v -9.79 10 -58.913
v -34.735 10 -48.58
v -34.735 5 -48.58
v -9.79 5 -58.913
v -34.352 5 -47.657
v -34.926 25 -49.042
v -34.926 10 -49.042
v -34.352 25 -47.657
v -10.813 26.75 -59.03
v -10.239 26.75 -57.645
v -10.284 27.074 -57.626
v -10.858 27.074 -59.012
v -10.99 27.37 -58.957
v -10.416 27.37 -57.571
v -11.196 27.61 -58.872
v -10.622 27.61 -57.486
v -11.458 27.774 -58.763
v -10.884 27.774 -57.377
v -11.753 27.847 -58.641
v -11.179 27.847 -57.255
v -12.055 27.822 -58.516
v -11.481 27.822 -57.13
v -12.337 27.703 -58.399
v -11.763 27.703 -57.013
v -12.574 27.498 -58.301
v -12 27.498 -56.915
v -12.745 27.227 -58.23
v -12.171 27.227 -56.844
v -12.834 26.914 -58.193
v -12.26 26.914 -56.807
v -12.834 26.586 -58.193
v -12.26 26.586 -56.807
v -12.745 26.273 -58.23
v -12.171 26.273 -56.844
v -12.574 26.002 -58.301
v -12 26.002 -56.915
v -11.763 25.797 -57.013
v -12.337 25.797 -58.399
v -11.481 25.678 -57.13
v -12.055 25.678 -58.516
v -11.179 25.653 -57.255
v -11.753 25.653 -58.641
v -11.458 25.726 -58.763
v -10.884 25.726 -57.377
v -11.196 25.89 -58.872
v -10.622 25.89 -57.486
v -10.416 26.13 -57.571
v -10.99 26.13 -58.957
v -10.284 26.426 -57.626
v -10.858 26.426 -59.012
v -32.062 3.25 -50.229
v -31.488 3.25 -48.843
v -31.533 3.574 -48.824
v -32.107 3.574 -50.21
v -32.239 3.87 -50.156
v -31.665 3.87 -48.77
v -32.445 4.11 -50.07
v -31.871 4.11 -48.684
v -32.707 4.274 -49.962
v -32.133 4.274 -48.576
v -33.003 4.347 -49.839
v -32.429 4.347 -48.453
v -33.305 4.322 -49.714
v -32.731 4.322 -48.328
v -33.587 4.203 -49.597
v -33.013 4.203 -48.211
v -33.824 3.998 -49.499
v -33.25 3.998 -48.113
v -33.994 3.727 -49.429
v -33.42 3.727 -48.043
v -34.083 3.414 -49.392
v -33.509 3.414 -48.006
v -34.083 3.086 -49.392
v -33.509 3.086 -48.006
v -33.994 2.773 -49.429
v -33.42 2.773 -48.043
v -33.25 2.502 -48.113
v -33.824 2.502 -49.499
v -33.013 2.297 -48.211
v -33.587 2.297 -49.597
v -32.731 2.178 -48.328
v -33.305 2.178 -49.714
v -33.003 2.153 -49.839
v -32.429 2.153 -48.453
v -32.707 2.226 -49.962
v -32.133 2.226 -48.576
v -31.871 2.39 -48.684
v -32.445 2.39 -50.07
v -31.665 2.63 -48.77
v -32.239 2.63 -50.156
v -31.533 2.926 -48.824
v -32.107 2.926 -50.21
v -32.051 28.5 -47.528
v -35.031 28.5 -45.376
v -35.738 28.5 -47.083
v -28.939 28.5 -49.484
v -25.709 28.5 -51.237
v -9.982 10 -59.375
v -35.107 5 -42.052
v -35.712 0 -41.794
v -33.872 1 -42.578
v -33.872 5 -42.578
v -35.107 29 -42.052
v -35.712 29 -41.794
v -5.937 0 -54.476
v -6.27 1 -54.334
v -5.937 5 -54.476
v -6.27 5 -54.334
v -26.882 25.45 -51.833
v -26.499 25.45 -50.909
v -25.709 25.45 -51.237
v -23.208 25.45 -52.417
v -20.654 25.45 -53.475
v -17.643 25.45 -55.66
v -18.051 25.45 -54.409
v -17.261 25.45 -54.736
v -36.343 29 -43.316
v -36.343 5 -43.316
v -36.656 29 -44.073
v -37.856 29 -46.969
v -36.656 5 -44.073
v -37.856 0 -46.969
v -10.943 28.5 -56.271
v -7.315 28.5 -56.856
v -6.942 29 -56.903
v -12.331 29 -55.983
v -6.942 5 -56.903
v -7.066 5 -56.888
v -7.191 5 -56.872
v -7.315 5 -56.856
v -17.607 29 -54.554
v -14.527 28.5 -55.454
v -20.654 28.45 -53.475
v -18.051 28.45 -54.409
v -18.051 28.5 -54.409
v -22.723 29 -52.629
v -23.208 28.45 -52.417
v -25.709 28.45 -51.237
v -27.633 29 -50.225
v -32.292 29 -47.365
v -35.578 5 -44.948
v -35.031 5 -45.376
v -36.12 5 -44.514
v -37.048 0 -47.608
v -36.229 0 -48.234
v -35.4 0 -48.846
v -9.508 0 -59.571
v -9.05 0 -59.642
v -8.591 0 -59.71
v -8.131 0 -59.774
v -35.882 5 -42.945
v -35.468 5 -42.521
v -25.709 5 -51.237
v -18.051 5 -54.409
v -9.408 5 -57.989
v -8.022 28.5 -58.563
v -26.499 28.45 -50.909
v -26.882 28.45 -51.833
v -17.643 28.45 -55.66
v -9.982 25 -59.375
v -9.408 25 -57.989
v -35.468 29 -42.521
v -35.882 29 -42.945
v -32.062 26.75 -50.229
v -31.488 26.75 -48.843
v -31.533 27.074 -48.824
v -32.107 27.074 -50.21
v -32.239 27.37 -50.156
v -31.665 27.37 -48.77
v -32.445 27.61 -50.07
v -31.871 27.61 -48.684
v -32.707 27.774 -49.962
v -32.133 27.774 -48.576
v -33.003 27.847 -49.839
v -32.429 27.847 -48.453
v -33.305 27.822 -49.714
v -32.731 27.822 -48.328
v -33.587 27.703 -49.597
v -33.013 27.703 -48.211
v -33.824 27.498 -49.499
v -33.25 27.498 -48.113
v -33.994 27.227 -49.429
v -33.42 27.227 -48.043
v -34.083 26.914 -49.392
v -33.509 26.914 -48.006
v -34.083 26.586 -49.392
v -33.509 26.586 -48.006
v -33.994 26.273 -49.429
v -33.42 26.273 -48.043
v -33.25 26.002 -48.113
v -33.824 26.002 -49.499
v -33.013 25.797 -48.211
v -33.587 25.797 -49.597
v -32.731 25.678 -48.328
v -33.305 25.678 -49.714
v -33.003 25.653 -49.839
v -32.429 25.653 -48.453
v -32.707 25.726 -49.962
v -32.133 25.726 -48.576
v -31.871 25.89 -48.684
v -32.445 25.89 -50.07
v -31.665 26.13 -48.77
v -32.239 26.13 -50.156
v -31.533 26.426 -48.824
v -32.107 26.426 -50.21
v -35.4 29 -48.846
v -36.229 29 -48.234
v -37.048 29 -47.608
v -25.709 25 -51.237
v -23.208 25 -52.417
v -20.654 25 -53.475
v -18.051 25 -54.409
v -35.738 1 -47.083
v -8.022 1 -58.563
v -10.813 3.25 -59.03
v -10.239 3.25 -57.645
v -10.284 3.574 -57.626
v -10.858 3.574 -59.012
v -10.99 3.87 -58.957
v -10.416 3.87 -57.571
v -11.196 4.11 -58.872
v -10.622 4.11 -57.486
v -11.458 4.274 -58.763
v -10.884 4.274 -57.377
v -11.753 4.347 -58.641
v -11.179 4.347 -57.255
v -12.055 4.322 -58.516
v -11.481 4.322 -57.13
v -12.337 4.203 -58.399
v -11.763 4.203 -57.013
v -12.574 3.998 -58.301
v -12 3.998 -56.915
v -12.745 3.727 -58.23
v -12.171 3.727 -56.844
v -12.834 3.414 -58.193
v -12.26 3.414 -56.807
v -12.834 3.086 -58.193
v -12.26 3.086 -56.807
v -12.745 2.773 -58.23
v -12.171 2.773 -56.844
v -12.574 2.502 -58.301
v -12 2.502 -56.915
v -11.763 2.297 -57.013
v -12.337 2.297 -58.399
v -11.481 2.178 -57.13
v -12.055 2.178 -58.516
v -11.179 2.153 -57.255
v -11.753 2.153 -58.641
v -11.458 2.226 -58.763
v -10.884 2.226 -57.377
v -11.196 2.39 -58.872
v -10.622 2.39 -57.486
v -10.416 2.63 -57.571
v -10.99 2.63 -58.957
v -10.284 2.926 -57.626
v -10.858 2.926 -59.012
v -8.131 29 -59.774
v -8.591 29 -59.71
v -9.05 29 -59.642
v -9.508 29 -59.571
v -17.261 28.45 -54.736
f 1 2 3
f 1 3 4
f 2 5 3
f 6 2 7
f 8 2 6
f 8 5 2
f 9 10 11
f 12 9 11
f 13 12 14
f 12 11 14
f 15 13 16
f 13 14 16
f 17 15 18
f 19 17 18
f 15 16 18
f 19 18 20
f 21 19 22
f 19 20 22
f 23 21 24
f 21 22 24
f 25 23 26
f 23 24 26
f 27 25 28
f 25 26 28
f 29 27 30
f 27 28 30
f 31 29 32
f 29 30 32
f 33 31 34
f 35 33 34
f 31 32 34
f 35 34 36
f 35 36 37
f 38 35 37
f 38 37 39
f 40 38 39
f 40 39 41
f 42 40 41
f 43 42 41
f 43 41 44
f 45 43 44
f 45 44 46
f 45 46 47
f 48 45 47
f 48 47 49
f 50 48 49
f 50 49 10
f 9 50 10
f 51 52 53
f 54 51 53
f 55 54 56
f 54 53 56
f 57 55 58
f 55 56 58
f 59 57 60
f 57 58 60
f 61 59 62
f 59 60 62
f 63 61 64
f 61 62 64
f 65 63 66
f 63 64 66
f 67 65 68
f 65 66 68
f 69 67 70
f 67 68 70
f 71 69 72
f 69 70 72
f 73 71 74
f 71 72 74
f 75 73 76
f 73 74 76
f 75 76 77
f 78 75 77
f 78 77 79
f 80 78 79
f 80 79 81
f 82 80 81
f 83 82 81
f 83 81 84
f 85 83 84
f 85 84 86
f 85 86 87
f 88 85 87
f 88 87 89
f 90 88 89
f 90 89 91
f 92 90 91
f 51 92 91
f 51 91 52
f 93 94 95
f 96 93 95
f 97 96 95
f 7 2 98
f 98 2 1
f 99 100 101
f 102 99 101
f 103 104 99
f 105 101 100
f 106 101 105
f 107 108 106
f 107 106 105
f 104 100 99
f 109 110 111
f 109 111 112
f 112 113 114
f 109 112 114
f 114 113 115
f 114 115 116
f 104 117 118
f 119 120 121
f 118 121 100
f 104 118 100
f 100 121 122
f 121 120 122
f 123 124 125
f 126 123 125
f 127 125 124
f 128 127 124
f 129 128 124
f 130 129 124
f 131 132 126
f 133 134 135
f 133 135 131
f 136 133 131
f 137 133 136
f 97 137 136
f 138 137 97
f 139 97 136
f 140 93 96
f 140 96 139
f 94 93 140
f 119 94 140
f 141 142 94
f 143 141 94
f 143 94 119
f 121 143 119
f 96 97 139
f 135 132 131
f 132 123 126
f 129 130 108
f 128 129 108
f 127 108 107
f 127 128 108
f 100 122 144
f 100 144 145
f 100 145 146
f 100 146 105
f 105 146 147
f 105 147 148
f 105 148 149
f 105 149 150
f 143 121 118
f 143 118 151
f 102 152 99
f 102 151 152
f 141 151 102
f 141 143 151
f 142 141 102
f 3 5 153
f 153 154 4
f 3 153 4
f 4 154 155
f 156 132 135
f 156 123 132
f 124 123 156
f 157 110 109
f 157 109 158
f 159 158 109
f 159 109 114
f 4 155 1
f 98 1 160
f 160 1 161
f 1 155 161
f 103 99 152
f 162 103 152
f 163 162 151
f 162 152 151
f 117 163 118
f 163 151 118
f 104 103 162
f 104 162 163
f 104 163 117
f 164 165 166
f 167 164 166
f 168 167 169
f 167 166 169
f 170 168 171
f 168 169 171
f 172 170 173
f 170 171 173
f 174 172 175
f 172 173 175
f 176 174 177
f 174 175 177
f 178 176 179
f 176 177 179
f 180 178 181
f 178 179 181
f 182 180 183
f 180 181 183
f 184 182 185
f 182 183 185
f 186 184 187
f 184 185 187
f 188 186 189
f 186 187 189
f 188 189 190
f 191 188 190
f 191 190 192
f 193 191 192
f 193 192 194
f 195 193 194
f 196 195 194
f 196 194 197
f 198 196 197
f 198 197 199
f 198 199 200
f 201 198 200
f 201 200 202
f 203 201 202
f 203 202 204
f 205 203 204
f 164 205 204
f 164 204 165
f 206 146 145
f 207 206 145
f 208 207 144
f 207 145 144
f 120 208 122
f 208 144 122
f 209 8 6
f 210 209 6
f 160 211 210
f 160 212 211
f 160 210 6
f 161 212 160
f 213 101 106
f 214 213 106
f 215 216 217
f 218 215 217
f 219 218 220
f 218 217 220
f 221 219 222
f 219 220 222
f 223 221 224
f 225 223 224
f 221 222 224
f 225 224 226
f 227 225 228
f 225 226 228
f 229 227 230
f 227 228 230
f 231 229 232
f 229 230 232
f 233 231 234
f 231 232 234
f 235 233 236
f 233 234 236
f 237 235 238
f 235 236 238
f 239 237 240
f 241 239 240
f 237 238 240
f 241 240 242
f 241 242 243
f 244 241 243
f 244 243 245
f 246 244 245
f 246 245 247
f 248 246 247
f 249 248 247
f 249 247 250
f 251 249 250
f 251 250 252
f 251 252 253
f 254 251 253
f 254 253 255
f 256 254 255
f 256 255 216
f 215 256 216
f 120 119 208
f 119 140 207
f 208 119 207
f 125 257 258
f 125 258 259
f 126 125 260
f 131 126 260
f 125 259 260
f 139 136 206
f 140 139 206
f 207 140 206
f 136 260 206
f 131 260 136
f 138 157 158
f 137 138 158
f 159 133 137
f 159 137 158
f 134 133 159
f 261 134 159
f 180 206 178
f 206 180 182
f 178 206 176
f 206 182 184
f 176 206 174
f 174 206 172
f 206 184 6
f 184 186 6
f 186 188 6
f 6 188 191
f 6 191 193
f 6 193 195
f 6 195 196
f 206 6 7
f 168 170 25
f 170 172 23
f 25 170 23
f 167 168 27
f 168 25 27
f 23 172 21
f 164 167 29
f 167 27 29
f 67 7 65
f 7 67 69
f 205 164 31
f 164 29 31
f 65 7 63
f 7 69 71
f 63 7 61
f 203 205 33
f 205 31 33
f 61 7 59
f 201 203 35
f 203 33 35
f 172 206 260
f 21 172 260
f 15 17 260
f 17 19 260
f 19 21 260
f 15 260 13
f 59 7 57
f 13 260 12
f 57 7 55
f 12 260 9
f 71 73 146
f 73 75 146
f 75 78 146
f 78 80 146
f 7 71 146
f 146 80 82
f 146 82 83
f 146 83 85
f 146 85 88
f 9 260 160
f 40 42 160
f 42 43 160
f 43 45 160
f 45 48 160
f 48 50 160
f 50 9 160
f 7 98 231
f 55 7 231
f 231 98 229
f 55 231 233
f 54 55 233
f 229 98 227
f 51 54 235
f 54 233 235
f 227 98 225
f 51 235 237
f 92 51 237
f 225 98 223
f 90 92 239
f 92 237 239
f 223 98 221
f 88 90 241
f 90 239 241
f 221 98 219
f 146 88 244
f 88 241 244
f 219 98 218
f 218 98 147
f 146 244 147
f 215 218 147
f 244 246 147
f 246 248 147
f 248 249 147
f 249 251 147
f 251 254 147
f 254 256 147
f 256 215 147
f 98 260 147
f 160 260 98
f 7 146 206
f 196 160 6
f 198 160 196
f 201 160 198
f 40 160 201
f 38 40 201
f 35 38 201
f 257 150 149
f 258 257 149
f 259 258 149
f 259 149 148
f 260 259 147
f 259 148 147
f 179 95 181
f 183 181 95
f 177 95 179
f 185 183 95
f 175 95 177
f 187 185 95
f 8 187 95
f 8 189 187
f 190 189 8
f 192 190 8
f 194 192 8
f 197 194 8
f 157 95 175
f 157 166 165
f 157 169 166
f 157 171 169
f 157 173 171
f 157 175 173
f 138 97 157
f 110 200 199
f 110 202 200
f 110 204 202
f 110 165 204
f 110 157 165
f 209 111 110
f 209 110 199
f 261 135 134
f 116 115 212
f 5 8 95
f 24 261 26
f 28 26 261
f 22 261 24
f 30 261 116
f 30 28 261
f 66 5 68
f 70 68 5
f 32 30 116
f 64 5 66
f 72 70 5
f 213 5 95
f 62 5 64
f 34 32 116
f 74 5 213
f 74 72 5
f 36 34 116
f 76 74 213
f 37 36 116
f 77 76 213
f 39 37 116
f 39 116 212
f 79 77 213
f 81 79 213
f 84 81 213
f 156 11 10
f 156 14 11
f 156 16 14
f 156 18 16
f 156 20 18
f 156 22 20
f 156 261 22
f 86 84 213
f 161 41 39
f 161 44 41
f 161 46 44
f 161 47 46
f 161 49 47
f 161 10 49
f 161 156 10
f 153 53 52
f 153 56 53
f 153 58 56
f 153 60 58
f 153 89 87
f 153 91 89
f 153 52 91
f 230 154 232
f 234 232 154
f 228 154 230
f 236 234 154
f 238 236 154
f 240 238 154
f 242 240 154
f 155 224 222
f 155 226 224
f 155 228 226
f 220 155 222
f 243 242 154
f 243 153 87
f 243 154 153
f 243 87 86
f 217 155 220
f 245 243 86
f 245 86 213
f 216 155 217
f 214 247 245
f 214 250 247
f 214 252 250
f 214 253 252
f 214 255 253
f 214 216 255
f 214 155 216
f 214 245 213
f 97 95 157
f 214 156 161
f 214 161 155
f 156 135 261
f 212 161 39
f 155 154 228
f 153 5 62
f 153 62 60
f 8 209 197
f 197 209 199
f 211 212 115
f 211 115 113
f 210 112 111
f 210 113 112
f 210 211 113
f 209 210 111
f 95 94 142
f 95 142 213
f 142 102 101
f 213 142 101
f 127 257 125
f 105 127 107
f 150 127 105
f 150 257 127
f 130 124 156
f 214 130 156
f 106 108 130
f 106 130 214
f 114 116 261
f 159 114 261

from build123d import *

# Parameters (mm, degrees)
SKETCH1_R                = 60.325
BOSS_EXTRUDE1_DEPTH      = 5
SKETCH3_R                = 60.325
SKETCH3_R_2              = 57.325
BOSS_EXTRUDE3_DEPTH      = 24
BOSS_EXTRUDE13_DEPTH     = 2
SKETCH7_R                = 5.5
CUT_EXTRUDE1_DEPTH       = 5
SKETCH14_R               = 2.5000000000000004
CUT_EXTRUDE7_DEPTH       = 5
SKETCH15_R               = 12.5
BOSS_EXTRUDE15_DEPTH     = 3
SKETCH16_R               = 10.5
CUT_EXTRUDE9_DEPTH       = 5
SKETCH17_R               = 2.5000000000000018
SKETCH17_R_2             = 2.500000000000002
SKETCH17_R_3             = 2.5000000000000004
CUT_EXTRUDE10_DEPTH      = 5
SKETCH20_W               = 10.617189631650703
SKETCH20_H               = 4.842928603910877
CUT_EXTRUDE13_DEPTH      = 1
SKETCH26_W               = 50
SKETCH26_H               = 24
BOSS_EXTRUDE46_DEPTH     = 10
SKETCH27_W               = 45
SKETCH27_H               = 20.000000000000004
CUT_EXTRUDE15_DEPTH      = 5
SKETCH29_R               = 1.0999999999999992
CUT_EXTRUDE17_DEPTH      = 10
CUT_EXTRUDE18_DEPTH      = 20
BOSS_EXTRUDE47_DEPTH     = 24
CUT_EXTRUDE19_START      = -30
CUT_EXTRUDE19_DEPTH      = 30
SKETCH31_R               = 3.0000000000000018
SKETCH31_R_2             = 3.0000000000000004
BOSS_EXTRUDE48_DEPTH     = 10
SKETCH32_R               = 1.5000000000000024
SKETCH32_R_2             = 1.5000000000000042
CUT_EXTRUDE20_DEPTH      = 5
SKETCH33_R               = 2.500000000000004
SKETCH33_R_2             = 2.4999999999999973
BOSS_EXTRUDE49_DEPTH     = 5
SKETCH34_R               = 1.100000000000003
SKETCH34_R_2             = 1.100000000000001
SKETCH34_R_3             = 1.1
SKETCH34_R_4             = 1.0999999999999983
CUT_EXTRUDE21_DEPTH      = 5
BOSS_EXTRUDE50_DEPTH     = 15
BOSS_EXTRUDE51_DEPTH     = 2
CUT_EXTRUDE25_DEPTH      = 2
CUT_EXTRUDE26_DEPTH      = 12
SKETCH41_R               = 1.0999999999999992
SKETCH41_R_2             = 1.100000000000001
CUT_EXTRUDE27_DEPTH      = 12
CUT_EXTRUDE28_DEPTH      = 4
CUT_EXTRUDE28_DEPTH_BACK = 2.5
SKETCH44_R               = 2.499999999999999
BOSS_EXTRUDE52_DEPTH     = 5
SKETCH45_R               = 1.0999999999999983
CUT_EXTRUDE29_DEPTH      = 5
CUT_EXTRUDE30_DEPTH      = 5
SKETCH47_R               = 1.100000000000001
CUT_EXTRUDE31_DEPTH      = 3
CUT_EXTRUDE32_DEPTH      = 5
SKETCH49_W               = 27
SKETCH49_H               = 5
CUT_EXTRUDE33_DEPTH      = 1
SKETCH50_W               = 54.2861765056904
SKETCH50_H               = 77.14351398178086
CUT_EXTRUDE34_DEPTH      = 121.99999999999999
CUT_EXTRUDE35_DEPTH      = 121.99999999999999
CUT_EXTRUDE35_DEPTH_BACK = 121.99999999999999


with BuildPart() as part:
    # Sketch1 → Boss-Extrude1 (new body)
    with BuildSketch(Plane(origin=(0, 0, 0), x_dir=(1, 0, 0), z_dir=(0, 1, 0))):
        Circle(SKETCH1_R)
    extrude(amount=BOSS_EXTRUDE1_DEPTH)

    # Sketch3 → Boss-Extrude3 (add)
    with BuildSketch(Plane(origin=(0, 5, 0), x_dir=(1, 0, 0), z_dir=(0, 1, 0))):
        Circle(SKETCH3_R)
        Circle(SKETCH3_R_2, mode=Mode.SUBTRACT)
    extrude(amount=BOSS_EXTRUDE3_DEPTH)

    # Sketch6 → Boss-Extrude13 (add)
    with BuildSketch(Plane.XY.offset(60.325)):
        Polygon((-7.5, 19.5), (7.5, 19.5), (7.5000000000000036, 4.500000000000001), (-7.4999999999999964, 4.500000000000001), align=None)
    extrude(amount=-BOSS_EXTRUDE13_DEPTH)

    # Sketch7 → Cut-Extrude1 (cut)
    with BuildSketch(Plane.XY.offset(60.325)):
        with Locations((0, 12.313384582393407)):
            Circle(SKETCH7_R)
    extrude(amount=-CUT_EXTRUDE1_DEPTH, mode=Mode.SUBTRACT)

    # Sketch14 → Cut-Extrude7 (cut)
    with BuildSketch(Plane(origin=(0, 0, -60.325), x_dir=(-1, 0, 0), z_dir=(0, 0, -1))):
        with Locations((0, 13.215899789160813)):
            Circle(SKETCH14_R)
    extrude(amount=-CUT_EXTRUDE7_DEPTH, mode=Mode.SUBTRACT)

    # Sketch15 → Boss-Extrude15 (add)
    with BuildSketch(Plane.ZY.offset(60.325)):
        with Locations((0, 14.079498945802262)):
            Circle(SKETCH15_R)
    extrude(amount=-BOSS_EXTRUDE15_DEPTH)

    # Sketch16 → Cut-Extrude9 (cut)
    with BuildSketch(Plane.ZY.offset(60.325)):
        with Locations((0, 14.367365331349822)):
            Circle(SKETCH16_R)
    extrude(amount=-CUT_EXTRUDE9_DEPTH, mode=Mode.SUBTRACT)

    # Sketch17 → Cut-Extrude10 (cut)
    with BuildSketch(Plane(origin=(0, 5, 0), x_dir=(1, 0, 0), z_dir=(0, 1, 0))):
        with Locations((0, 40)):
            Circle(SKETCH17_R)
        with Locations((40, 0)):
            Circle(SKETCH17_R_2)
        with Locations((0, -40)):
            Circle(SKETCH17_R_3)
        with Locations((-40, 0)):
            Circle(SKETCH17_R_2)
    extrude(amount=-CUT_EXTRUDE10_DEPTH, mode=Mode.SUBTRACT)

    # Sketch20 → Cut-Extrude13 (cut)
    with BuildSketch(Plane(origin=(0, 5, 0), x_dir=(1, 0, 0), z_dir=(0, 1, 0))):
        with Locations((0.20330529432061706, 46.91179778863133)):
            Rectangle(SKETCH20_W, SKETCH20_H)
    extrude(amount=-CUT_EXTRUDE13_DEPTH, mode=Mode.SUBTRACT)

    # Sketch26 → Boss-Extrude46 (add)
    with BuildSketch(Plane(origin=(50, 0, 0), x_dir=(0, 0, -1), z_dir=(1, 0, 0))):
        with Locations((3.55e-15, 17.000000000000004)):
            Rectangle(SKETCH26_W, SKETCH26_H)
    extrude(amount=BOSS_EXTRUDE46_DEPTH)

    # Sketch27 → Cut-Extrude15 (cut)
    with BuildSketch(Plane(origin=(60.325, 0, 0), x_dir=(0, 0, -1), z_dir=(1, 0, 0))):
        with Locations((7.11e-15, 15.000000000000002)):
            Rectangle(SKETCH27_W, SKETCH27_H)
    extrude(amount=-CUT_EXTRUDE15_DEPTH, mode=Mode.SUBTRACT)

    # Sketch29 → Cut-Extrude17 (cut)
    with BuildSketch(Plane(origin=(55.325, 0, 0), x_dir=(0, 0, -1), z_dir=(1, 0, 0))):
        with Locations((-19.999999999999986, 20.999999999999996)):
            Circle(SKETCH29_R)
        with Locations((-19.999999999999986, 9)):
            Circle(SKETCH29_R)
        with Locations((20.000000000000018, 20.999999999999996)):
            Circle(SKETCH29_R)
        with Locations((20.000000000000014, 9.151874819132662)):
            Circle(SKETCH29_R)
    extrude(amount=-CUT_EXTRUDE17_DEPTH, mode=Mode.SUBTRACT)

    # Sketch28 → Cut-Extrude18 (cut)
    with BuildSketch(Plane(origin=(60.325, 0, 0), x_dir=(0, 0, -1), z_dir=(1, 0, 0))):
        Polygon((-17.499999999999996, 23.348125180867335), (17.500000000000004, 23.348125180867342), (17.500000000000007, 6.6518748191326615), (-17.499999999999996, 6.651874819132655), align=None)
    extrude(amount=-CUT_EXTRUDE18_DEPTH, mode=Mode.SUBTRACT)

    # Sketch5 → Boss-Extrude47 (add)
    with BuildSketch(Plane(origin=(0, 5, 0), x_dir=(1, 0, 0), z_dir=(0, 1, 0))):
        with BuildLine():
            ThreePointArc((-43.739295545453594, 37.05441471926724), (-35.70889244992055, 35.708892449920754), (-37.054414719267506, 43.73929554545372))
            ThreePointArc((-37.05441471926745, 43.73929554545359), (-38.52084651181077, 42.453504084039004), (-39.94269093151786, 41.118573250408886))
            ThreePointArc((-39.94269093151788, 41.11857325040891), (-37.83021279348029, 37.83021279348028), (-41.1185732504089, 39.942690931517895))
            ThreePointArc((-41.11857325040886, 39.94269093151788), (-42.45350408403905, 38.520846511810724), (-43.739295545453714, 37.0544147192673))
        make_face()
        with BuildLine():
            ThreePointArc((37.05441471926732, 43.73929554545373), (35.70889244992064, 35.70889244992067), (43.739295545453665, 37.05441471926758))
            ThreePointArc((43.73929554545353, 37.05441471926752), (42.45350408403893, 38.52084651181085), (41.11857325040883, 39.94269093151792))
            ThreePointArc((41.11857325040885, 39.94269093151794), (37.83021279348023, 37.830212793480364), (39.94269093151782, 41.11857325040898))
            ThreePointArc((39.942690931517795, 41.11857325040895), (38.52084651181068, 42.45350408403908), (37.05441471926731, 43.739295545453714))
        make_face()
        with BuildLine():
            ThreePointArc((-43.73929554545361, -37.05441471926742), (-42.45350408403899, -38.52084651181079), (-41.11857325040885, -39.94269093151789))
            ThreePointArc((-41.118573250408886, -39.94269093151791), (-37.83021279348029, -37.83021279348027), (-39.94269093151786, -41.11857325040891))
            ThreePointArc((-39.94269093151787, -41.11857325040888), (-38.520846511810724, -42.45350408403905), (-37.05441471926732, -43.7392955454537))
            ThreePointArc((-37.05441471926724, -43.73929554545361), (-35.70889244992073, -35.70889244992055), (-43.739295545453714, -37.05441471926749))
        make_face()
        with BuildLine():
            ThreePointArc((43.73929554545405, -37.0544147192667), (35.70889244992104, -35.70889244992027), (37.054414719267896, -43.7392955454532))
            ThreePointArc((37.05441471926789, -43.73929554545322), (38.52084651181126, -42.45350408403856), (39.94269093151833, -41.11857325040843))
            ThreePointArc((39.94269093151833, -41.11857325040844), (37.83021279348074, -37.83021279347984), (41.118573250409426, -39.942690931517305))
            ThreePointArc((41.118573250409405, -39.942690931517326), (42.453504084039544, -38.520846511810184), (43.739295545454155, -37.05441471926678))
        make_face()
    extrude(amount=BOSS_EXTRUDE47_DEPTH)

    # Sketch30 → Cut-Extrude19 (cut)
    with BuildSketch(Plane(origin=(0, 29, 0), x_dir=(1, 0, 0), z_dir=(0, 1, 0)).offset(CUT_EXTRUDE19_START)):
        with BuildLine():
            Line((51.783140736674326, 30.9453059517236), (68.40972028142612, 30.9453059517236))
            ThreePointArc((68.40972028142612, 30.9453059517236), (75.07900376332695, -0.803108545018857), (67.73210824333012, -32.401594132736065))
            Line((67.73210824333012, -32.401594132736065), (50.88459808878757, -32.401594132736065))
            ThreePointArc((50.88459808878757, -32.401594132736065), (60.31893223906523, -0.8555925075975032), (51.783140736674326, 30.9453059517236))
        make_face()
    extrude(amount=CUT_EXTRUDE19_DEPTH, mode=Mode.SUBTRACT)

    # Sketch31 → Boss-Extrude48 (add)
    with BuildSketch(Plane(origin=(0, 5, 0), x_dir=(1, 0, 0), z_dir=(0, 1, 0))):
        with Locations((-33.05, 28)):
            Circle(SKETCH31_R)
        with Locations((-14.000000000000004, 28)):
            Circle(SKETCH31_R_2)
        with Locations((-13.999999999999996, -27.88)):
            Circle(SKETCH31_R_2)
        with Locations((-33.05, -27.88)):
            Circle(SKETCH31_R)
    extrude(amount=BOSS_EXTRUDE48_DEPTH)

    # Sketch32 → Cut-Extrude20 (cut)
    with BuildSketch(Plane(origin=(0, 15, 0), x_dir=(1, 0, 0), z_dir=(0, 1, 0))):
        with Locations((-13.999999999999996, -27.88)):
            Circle(SKETCH32_R)
        with Locations((-33.05, -27.88)):
            Circle(SKETCH32_R_2)
        with Locations((-33.05, 28)):
            Circle(SKETCH32_R_2)
        with Locations((-14.000000000000004, 28)):
            Circle(SKETCH32_R)
    extrude(amount=-CUT_EXTRUDE20_DEPTH, mode=Mode.SUBTRACT)

    # Sketch33 → Boss-Extrude49 (add)
    with BuildSketch(Plane(origin=(0, 5, 0), x_dir=(1, 0, 0), z_dir=(0, 1, 0))):
        with Locations((-5.000000000000004, 35)):
            Circle(SKETCH33_R)
        with Locations((6.3999989036082425, 35.004999773071894)):
            Circle(SKETCH33_R_2)
        Polygon((-6.750000000000009, -14.647089988643435), (-3.2500000000000084, -14.647089988643431), (-3.2500000000000084, -9.352910011356565), (-6.750000000000009, -9.352910011356565), align=None)
        Polygon((4.649999999999994, -14.647089988643435), (8.149999999999995, -14.647089988643435), (8.149999999999993, -9.352910011356565), (4.649999999999994, -9.352910011356565), align=None)
    extrude(amount=BOSS_EXTRUDE49_DEPTH)

    # Sketch34 → Cut-Extrude21 (cut)
    with BuildSketch(Plane(origin=(0, 10, 0), x_dir=(1, 0, 0), z_dir=(0, 1, 0))):
        with Locations((6.3999989036082425, 35.004999773071894)):
            Circle(SKETCH34_R)
        with Locations((6.399998903608244, -12)):
            Circle(SKETCH34_R_2)
        with Locations((-5.000000000000003, -12)):
            Circle(SKETCH34_R_3)
        with Locations((-5.000000000000004, 35)):
            Circle(SKETCH34_R_4)
    extrude(amount=-CUT_EXTRUDE21_DEPTH, mode=Mode.SUBTRACT)

    # Sketch35 → Boss-Extrude50 (add)
    with BuildSketch(Plane(origin=(0, 5, 0), x_dir=(1, 0, 0), z_dir=(0, 1, 0))):
        Polygon((13.999999999999998, 20), (16.999999999999996, 20), (17, -20), (14.000000000000004, -20), align=None)
    extrude(amount=BOSS_EXTRUDE50_DEPTH)

    # Sketch39 → Boss-Extrude51 (add)
    with BuildSketch(Plane(origin=(21.171960895598467, 0, 51.113635136187), x_dir=(0, -1, 0), z_dir=(0.38268343236508734, 0, 0.9238795325112877))):
        Polygon((-29, 15.014391088551141), (-5.000000000000002, 15.014391088551141), (-4.999999999999997, -14.985608911448859), (-29, -14.985608911448859), align=None)
    boss_extrude51 = extrude(amount=BOSS_EXTRUDE51_DEPTH)

    # Sketch37 → Cut-Extrude25 (cut)
    with BuildSketch(Plane(origin=(23.0853780574239, 0, 55.73303279874344), x_dir=(0, -1, 0), z_dir=(0.38268343236508734, 0, 0.9238795325112877))):
        Polygon((-25, 13.999999999999996), (-5.000000000000001, 13.999999999999996), (-4.999999999999999, -14.000000000000004), (-24.999999999999996, -14.000000000000004), align=None)
    cut_extrude25 = extrude(amount=-CUT_EXTRUDE25_DEPTH, mode=Mode.SUBTRACT)

    # Sketch40 → Cut-Extrude26 (cut)
    with BuildSketch(Plane(origin=(23.0853780574239, 0, 55.73303279874344), x_dir=(0, -1, 0), z_dir=(0.38268343236508734, 0, 0.9238795325112877))):
        Polygon((-23, 9.999999999999996), (-7.000000000000003, 9.999999999999996), (-6.999999999999998, -10.000000000000004), (-22.999999999999996, -10.000000000000004), align=None)
    cut_extrude26 = extrude(amount=-CUT_EXTRUDE26_DEPTH, mode=Mode.SUBTRACT)

    # Sketch41 → Cut-Extrude27 (cut)
    with BuildSketch(Plane(origin=(23.0853780574239, 0, 55.73303279874344), x_dir=(0, -1, 0), z_dir=(0.38268343236508734, 0, 0.9238795325112877))):
        with Locations((-21, 12)):
            Circle(SKETCH41_R)
        with Locations((-9.000000000000002, 12)):
            Circle(SKETCH41_R_2)
        with Locations((-8.999999999999998, -12)):
            Circle(SKETCH41_R_2)
        with Locations((-20.999999999999996, -12)):
            Circle(SKETCH41_R)
    cut_extrude27 = extrude(amount=-CUT_EXTRUDE27_DEPTH, mode=Mode.SUBTRACT)

    # Mirror2: Boss-Extrude51, Cut-Extrude25, Cut-Extrude26, Cut-Extrude27 across plane
    add(boss_extrude51.mirror(Plane(origin=(0, 0, 0), x_dir=(0, 0, 1), z_dir=(1, 0, 0))))
    add(cut_extrude25.mirror(Plane(origin=(0, 0, 0), x_dir=(0, 0, 1), z_dir=(1, 0, 0))), mode=Mode.SUBTRACT)
    add(cut_extrude26.mirror(Plane(origin=(0, 0, 0), x_dir=(0, 0, 1), z_dir=(1, 0, 0))), mode=Mode.SUBTRACT)
    add(cut_extrude27.mirror(Plane(origin=(0, 0, 0), x_dir=(0, 0, 1), z_dir=(1, 0, 0))), mode=Mode.SUBTRACT)

    # Sketch43 → Cut-Extrude28 (cut, two sides: drawn at the far end of the back side and taken through both)
    with BuildSketch(Plane(origin=(-20.923216664561146, 0, -50.51311344005465), x_dir=(0, -1, 0), z_dir=(0.38268343236508734, 0, 0.9238795325112877)).offset(-CUT_EXTRUDE28_DEPTH_BACK)):
        Polygon((-28.5, 15), (-1.0000000000000009, 15), (-0.9999999999999974, -15), (-28.499999999999996, -15), align=None)
    extrude(amount=CUT_EXTRUDE28_DEPTH + CUT_EXTRUDE28_DEPTH_BACK, mode=Mode.SUBTRACT)

    # Sketch44 → Boss-Extrude52 (add)
    with BuildSketch(Plane(origin=(0, 5, 0), x_dir=(1, 0, 0), z_dir=(0, 1, 0))):
        with Locations((-20, 45)):
            Circle(SKETCH44_R)
        with Locations((18.229539652623778, 45)):
            Circle(SKETCH44_R)
        with Locations((18.229539652623778, -32.02717202587299)):
            Circle(SKETCH44_R)
    extrude(amount=BOSS_EXTRUDE52_DEPTH)

    # Sketch45 → Cut-Extrude29 (cut)
    with BuildSketch(Plane(origin=(0, 10, 0), x_dir=(1, 0, 0), z_dir=(0, 1, 0))):
        with Locations((-20, 45)):
            Circle(SKETCH45_R)
        with Locations((18.229539652623778, 45)):
            Circle(SKETCH45_R)
        with Locations((18.229539652623778, -32.02717202587299)):
            Circle(SKETCH45_R)
    extrude(amount=-CUT_EXTRUDE29_DEPTH, mode=Mode.SUBTRACT)

    # Sketch46 → Cut-Extrude30 (cut)
    with BuildSketch(Plane(origin=(-21.879925245473853, 0, -52.82281227133289), x_dir=(0.9238795325112877, 0, -0.38268343236508756), z_dir=(0.38268343236508756, 0, 0.9238795325112877))):
        Polygon((-13.50000000000003, 25), (13.49999999999997, 25), (13.499999999999968, 10), (-13.500000000000028, 10), align=None)
    extrude(amount=-CUT_EXTRUDE30_DEPTH, mode=Mode.SUBTRACT)

    # Sketch47 → Cut-Extrude31 (cut)
    with BuildSketch(Plane(origin=(-21.879925245473853, 0, -52.82281227133289), x_dir=(0.9238795325112877, 0, -0.38268343236508756), z_dir=(0.38268343236508756, 0, 0.9238795325112877))):
        with Locations((11.500000000000005, 26.75)):
            Circle(SKETCH47_R)
        with Locations((-11.499999999999995, 26.75)):
            Circle(SKETCH47_R)
        with Locations((-11.5, 3.25)):
            Circle(SKETCH47_R)
        with Locations((11.500000000000002, 3.25)):
            Circle(SKETCH47_R)
    extrude(amount=-CUT_EXTRUDE31_DEPTH, mode=Mode.SUBTRACT)

    # Sketch48 → Cut-Extrude32 (cut)
    with BuildSketch(Plane(origin=(-22.453950394021497, 0, -54.208631570099804), x_dir=(0, -1, 0), z_dir=(0.38268343236508734, 0, 0.9238795325112877))):
        Polygon((-35, 15), (4.999999999999997, 15), (5.000000000000004, -15), (-34.99999999999999, -15), align=None)
    extrude(amount=-CUT_EXTRUDE32_DEPTH, mode=Mode.SUBTRACT)

    # Sketch49 → Cut-Extrude33 (cut)
    with BuildSketch(Plane(origin=(-21.87992524547385, 0, -52.82281227133288), x_dir=(0.9238795325112878, 0, -0.3826834323650871), z_dir=(0.3826834323650871, 0, 0.9238795325112878))):
        Polygon((-5.0000000000000036, 28.45000478430176), (4.9999999999999964, 28.45000478430176), (4.999999999999996, 25.45000478430176), (-5.000000000000003, 25.45000478430176), align=None)
        with Locations((-4.44e-15, 7.5)):
            Rectangle(SKETCH49_W, SKETCH49_H)
    extrude(amount=-CUT_EXTRUDE33_DEPTH, mode=Mode.SUBTRACT)

    # Sketch50 → Cut-Extrude34 (cut)
    with BuildSketch(Plane(origin=(-22.453950394021497, 0, -54.208631570099804), x_dir=(0, -1, 0), z_dir=(0.38268343236508734, 0, 0.9238795325112877))):
        with Locations((-17.857252330295086, 53.93404146233521)):
            Rectangle(SKETCH50_W, SKETCH50_H)
        Polygon((-45.000340583140286, -17), (9.28583592255012, -17), (9.28583592255013, -76.71479415626372), (-45.00034058314028, -76.71479415626372), align=None)
    extrude(amount=CUT_EXTRUDE34_DEPTH, mode=Mode.SUBTRACT)

    # Sketch51 → Cut-Extrude35 (cut, two sides: drawn at the far end of the back side and taken through both)
    with BuildSketch(Plane(origin=(0, 5, 0), x_dir=(1, 0, 0), z_dir=(0, 1, 0)).offset(-CUT_EXTRUDE35_DEPTH_BACK)):
        Polygon((-45.373232140480866, 37.67891691481655), (7.973371924553829, 60.4006186462202), (56.61957897539295, -53.8122152992282), (1.6860833467658822, -72.80817162045847), align=None)
    extrude(amount=CUT_EXTRUDE35_DEPTH + CUT_EXTRUDE35_DEPTH_BACK, mode=Mode.SUBTRACT)


solid = part.part
